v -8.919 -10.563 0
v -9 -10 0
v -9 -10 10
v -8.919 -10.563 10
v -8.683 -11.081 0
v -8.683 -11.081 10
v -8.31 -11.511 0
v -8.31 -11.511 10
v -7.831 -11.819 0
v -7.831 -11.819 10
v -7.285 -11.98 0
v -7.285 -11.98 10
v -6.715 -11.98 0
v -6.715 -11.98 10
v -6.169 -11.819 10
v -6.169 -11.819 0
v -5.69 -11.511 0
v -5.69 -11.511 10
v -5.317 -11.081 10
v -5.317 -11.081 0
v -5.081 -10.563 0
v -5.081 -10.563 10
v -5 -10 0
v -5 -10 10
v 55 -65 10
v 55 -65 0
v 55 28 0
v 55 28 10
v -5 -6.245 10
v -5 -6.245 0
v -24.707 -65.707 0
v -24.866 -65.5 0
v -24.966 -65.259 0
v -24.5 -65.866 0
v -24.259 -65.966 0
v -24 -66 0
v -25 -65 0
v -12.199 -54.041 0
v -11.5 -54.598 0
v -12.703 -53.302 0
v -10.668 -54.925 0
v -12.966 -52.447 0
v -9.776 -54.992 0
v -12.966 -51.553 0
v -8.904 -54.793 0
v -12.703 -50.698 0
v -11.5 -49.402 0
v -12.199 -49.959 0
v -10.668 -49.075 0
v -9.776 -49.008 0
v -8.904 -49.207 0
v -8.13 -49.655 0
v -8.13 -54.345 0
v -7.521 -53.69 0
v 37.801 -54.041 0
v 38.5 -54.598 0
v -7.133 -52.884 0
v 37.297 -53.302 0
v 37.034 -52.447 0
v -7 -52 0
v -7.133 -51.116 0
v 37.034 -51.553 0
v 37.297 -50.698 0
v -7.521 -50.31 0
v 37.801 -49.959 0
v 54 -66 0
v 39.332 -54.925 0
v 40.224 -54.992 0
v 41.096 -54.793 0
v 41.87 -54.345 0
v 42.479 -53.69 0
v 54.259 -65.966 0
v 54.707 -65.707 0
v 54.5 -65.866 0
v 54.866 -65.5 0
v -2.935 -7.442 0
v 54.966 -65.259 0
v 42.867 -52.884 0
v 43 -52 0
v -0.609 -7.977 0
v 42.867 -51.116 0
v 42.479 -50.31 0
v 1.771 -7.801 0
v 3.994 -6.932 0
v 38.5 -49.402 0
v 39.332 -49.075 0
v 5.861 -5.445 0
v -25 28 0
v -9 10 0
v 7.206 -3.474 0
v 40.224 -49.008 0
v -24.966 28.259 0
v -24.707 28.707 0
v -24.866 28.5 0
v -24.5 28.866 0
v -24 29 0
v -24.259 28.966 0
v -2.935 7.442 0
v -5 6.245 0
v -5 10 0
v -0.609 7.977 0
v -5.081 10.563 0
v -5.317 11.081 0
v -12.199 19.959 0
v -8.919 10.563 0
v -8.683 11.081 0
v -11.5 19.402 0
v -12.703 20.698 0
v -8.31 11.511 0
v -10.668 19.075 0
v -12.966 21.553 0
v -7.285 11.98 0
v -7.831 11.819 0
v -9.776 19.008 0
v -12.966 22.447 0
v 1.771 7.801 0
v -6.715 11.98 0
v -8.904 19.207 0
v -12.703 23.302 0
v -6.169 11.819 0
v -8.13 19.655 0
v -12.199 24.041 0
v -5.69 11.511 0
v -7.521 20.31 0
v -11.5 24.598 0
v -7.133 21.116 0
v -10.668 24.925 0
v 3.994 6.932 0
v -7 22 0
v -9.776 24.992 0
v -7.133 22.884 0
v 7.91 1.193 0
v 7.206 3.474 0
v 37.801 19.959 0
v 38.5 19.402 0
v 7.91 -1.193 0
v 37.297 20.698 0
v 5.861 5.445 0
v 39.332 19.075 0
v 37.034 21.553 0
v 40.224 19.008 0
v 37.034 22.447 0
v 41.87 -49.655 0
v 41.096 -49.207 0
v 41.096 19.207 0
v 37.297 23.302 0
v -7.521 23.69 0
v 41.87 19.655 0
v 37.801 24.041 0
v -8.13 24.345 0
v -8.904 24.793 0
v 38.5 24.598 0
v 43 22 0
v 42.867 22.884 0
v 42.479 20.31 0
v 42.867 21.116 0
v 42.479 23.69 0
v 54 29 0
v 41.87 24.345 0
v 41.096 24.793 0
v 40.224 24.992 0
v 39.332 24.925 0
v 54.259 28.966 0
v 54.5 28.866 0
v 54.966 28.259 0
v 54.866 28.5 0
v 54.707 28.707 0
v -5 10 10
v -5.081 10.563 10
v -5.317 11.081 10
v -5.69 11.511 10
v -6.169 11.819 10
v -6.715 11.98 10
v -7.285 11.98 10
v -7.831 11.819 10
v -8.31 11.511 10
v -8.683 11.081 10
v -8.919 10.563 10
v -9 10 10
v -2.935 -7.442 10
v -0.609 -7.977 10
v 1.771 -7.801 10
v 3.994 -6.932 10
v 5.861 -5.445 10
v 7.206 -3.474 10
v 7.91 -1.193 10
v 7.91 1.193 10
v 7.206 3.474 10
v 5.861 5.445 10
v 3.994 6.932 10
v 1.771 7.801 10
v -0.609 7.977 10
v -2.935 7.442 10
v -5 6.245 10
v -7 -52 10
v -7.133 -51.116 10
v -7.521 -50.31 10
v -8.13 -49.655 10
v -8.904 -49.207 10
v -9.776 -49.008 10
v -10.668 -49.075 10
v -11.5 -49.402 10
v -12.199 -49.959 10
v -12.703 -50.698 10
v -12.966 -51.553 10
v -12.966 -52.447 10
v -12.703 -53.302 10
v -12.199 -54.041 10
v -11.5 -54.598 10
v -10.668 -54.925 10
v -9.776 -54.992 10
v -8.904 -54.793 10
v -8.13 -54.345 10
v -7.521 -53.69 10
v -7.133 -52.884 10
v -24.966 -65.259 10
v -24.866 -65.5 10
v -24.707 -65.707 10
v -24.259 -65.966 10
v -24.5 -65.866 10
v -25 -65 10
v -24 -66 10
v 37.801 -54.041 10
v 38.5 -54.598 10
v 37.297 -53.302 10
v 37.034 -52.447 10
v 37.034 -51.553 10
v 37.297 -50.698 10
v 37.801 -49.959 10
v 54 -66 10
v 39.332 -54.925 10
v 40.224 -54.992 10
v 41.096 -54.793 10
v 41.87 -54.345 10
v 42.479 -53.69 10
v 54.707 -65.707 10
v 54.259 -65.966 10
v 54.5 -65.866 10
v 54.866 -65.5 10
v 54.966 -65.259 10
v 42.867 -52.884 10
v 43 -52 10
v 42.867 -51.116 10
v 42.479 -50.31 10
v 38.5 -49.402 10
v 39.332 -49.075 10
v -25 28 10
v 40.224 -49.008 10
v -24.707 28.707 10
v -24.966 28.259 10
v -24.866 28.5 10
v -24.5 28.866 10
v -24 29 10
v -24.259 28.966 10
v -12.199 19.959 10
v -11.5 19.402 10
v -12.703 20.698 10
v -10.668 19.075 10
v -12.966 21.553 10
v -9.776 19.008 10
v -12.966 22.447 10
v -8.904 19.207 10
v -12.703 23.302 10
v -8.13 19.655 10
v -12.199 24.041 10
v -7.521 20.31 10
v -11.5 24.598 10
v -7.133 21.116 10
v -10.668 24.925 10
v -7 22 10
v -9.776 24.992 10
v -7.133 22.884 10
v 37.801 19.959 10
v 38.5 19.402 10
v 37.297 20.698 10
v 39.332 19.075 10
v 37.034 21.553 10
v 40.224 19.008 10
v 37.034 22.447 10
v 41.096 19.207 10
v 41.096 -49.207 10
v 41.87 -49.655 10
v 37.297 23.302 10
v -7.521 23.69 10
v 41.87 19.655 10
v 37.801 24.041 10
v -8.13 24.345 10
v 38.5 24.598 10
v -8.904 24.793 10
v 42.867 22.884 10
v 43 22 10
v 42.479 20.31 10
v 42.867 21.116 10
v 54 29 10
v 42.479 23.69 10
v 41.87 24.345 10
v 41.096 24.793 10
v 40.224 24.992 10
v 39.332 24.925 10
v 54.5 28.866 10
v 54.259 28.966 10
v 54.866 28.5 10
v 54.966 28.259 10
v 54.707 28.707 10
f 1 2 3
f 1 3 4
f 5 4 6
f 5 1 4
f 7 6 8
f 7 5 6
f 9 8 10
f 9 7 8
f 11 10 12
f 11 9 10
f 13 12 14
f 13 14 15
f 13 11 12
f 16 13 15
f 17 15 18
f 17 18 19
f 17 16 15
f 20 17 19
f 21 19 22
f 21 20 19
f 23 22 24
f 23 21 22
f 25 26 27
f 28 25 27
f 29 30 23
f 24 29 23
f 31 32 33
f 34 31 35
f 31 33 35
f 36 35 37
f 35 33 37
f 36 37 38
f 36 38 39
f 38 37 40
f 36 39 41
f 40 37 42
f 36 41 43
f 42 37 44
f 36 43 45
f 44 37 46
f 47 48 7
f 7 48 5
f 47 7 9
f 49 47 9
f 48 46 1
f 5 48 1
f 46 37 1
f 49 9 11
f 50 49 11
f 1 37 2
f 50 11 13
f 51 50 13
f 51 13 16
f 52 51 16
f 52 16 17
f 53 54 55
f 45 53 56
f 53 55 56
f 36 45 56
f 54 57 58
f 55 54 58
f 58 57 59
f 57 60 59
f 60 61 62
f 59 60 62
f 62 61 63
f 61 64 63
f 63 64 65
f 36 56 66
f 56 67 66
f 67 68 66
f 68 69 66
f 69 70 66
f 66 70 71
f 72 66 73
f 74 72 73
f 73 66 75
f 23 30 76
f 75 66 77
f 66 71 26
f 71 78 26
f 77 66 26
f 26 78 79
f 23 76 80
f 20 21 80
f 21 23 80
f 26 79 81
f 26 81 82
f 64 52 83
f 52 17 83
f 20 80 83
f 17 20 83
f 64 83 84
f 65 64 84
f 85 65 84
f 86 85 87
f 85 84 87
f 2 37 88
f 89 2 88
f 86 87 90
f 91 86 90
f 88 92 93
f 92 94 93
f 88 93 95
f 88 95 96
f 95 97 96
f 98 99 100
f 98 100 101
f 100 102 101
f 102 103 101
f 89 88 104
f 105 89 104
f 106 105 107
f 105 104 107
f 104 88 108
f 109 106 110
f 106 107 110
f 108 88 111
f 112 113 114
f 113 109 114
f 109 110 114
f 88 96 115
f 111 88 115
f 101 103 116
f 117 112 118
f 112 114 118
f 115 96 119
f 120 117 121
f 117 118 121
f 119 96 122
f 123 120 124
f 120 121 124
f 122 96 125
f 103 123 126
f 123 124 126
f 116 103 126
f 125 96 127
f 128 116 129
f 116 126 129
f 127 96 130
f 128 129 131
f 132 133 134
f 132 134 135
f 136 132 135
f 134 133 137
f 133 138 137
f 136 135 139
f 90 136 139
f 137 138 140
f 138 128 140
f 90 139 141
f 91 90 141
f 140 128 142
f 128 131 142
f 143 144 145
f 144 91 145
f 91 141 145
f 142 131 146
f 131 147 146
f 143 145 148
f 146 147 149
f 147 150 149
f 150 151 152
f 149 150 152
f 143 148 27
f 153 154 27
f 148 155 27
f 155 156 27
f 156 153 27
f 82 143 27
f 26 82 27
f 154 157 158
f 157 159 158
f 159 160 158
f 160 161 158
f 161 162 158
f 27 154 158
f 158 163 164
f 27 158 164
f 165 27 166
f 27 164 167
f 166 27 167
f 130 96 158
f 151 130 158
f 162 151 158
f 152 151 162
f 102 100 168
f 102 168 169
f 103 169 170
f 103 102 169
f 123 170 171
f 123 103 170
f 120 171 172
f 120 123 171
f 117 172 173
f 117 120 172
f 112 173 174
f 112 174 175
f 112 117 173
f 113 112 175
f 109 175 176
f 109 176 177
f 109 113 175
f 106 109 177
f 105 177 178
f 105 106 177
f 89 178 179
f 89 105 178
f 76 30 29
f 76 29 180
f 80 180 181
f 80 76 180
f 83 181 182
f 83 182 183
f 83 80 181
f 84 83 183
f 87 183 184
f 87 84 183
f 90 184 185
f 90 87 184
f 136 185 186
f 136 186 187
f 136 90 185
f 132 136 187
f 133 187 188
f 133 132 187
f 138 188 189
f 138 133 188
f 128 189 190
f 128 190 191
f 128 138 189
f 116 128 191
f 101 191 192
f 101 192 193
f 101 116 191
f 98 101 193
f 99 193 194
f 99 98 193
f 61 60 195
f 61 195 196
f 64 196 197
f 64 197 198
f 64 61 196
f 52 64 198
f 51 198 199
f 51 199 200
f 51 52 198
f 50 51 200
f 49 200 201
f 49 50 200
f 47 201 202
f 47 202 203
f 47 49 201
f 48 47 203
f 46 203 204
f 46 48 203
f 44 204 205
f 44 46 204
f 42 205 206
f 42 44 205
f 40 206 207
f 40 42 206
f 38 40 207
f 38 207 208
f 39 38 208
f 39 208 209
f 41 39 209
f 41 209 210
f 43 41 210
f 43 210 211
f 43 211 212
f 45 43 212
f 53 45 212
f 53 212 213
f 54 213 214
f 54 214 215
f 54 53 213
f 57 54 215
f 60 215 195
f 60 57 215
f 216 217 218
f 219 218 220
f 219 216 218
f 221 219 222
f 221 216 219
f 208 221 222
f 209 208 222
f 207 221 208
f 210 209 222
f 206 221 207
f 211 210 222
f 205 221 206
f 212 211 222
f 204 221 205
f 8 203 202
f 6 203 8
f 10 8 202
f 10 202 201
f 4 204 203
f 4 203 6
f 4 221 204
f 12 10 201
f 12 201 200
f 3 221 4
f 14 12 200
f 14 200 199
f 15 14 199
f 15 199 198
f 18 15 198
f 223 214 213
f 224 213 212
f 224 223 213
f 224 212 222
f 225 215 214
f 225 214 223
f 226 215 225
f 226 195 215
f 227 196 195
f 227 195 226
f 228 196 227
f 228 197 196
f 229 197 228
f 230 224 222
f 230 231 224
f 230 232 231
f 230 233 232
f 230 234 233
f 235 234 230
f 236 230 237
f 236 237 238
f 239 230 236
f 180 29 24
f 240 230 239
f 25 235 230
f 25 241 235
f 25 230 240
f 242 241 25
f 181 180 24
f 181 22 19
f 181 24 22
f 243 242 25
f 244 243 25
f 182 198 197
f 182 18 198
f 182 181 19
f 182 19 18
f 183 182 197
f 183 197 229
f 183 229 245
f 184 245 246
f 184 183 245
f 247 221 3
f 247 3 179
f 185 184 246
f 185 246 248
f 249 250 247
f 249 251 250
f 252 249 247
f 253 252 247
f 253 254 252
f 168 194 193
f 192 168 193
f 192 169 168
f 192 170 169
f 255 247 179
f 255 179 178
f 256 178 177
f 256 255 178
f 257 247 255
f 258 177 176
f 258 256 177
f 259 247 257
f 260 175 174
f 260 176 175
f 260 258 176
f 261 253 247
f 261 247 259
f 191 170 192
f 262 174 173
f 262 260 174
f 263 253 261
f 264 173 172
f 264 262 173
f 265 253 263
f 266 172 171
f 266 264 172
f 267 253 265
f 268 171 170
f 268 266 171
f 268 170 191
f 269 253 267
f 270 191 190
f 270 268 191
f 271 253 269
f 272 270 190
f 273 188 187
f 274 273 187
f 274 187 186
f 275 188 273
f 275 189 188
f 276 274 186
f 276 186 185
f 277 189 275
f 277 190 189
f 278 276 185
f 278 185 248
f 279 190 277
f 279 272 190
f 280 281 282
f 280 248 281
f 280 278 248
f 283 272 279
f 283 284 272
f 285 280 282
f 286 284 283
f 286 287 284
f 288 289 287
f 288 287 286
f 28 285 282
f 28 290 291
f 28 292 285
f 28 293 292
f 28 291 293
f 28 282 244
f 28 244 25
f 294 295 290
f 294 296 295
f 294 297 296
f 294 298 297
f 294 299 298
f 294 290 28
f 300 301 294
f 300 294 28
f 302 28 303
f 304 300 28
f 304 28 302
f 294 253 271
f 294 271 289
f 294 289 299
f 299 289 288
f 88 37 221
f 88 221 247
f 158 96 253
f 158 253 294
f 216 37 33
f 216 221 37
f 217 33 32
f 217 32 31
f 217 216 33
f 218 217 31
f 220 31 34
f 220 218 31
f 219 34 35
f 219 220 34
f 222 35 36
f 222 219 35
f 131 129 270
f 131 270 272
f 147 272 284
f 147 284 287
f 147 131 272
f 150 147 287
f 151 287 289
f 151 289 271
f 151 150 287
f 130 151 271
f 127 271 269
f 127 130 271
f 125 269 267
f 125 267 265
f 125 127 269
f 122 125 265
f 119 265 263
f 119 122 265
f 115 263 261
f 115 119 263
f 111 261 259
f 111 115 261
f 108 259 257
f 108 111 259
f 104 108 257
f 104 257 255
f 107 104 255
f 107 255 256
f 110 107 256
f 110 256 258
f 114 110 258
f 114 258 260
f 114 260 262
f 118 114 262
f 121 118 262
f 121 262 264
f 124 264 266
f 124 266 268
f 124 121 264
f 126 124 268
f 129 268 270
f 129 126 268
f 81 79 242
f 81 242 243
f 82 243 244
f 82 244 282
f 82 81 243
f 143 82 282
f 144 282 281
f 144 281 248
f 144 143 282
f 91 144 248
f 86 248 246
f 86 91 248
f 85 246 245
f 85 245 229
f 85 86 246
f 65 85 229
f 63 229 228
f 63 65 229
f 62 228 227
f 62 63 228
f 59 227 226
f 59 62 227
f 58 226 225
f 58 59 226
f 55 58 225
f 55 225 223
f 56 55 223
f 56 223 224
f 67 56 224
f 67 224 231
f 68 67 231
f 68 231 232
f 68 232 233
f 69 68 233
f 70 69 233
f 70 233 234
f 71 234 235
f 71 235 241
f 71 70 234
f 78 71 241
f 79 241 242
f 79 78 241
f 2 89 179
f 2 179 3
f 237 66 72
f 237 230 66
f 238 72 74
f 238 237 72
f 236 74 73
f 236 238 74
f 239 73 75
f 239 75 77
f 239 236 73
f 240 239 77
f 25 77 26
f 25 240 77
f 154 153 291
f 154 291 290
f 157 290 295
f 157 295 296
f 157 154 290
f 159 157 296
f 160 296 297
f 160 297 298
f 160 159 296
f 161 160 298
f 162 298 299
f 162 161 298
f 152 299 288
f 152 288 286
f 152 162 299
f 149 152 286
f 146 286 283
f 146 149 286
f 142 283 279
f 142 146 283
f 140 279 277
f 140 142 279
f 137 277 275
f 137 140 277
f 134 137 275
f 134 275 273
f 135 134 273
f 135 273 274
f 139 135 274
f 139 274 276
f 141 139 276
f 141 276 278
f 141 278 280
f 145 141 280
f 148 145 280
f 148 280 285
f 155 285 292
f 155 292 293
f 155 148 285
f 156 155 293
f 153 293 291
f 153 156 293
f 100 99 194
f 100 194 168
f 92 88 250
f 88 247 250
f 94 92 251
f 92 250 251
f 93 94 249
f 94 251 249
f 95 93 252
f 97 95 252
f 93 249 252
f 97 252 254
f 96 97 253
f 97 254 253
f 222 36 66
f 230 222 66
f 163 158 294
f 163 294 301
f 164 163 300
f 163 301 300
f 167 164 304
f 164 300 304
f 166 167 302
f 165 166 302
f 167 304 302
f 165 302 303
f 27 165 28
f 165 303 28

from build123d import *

# Parameters (mm, degrees)
SKETCH_W    = 80
SKETCH_H    = 95
SKETCH_R    = 3
PAD_DEPTH   = 10
FILLET_R    = 1
FILLET001_R = 1


with BuildPart() as part:
    # Sketch → Pad (new body)
    with BuildSketch(Plane.XY):
        with Locations((15, -18.5)):
            Rectangle(SKETCH_W, SKETCH_H)
        with Locations((-10, -52)):
            Circle(SKETCH_R, mode=Mode.SUBTRACT)
        with Locations((40, -52)):
            Circle(SKETCH_R, mode=Mode.SUBTRACT)
        with Locations((40, 22)):
            Circle(SKETCH_R, mode=Mode.SUBTRACT)
        with Locations((-10, 22)):
            Circle(SKETCH_R, mode=Mode.SUBTRACT)
        with BuildLine():
            ThreePointArc((-5, -6.244998), (8, 0), (-5, 6.244998))
            Line((-5, 6.244998), (-5, 10))
            ThreePointArc((-5, 10), (-7, 12), (-9, 10))
            Line((-9, 10), (-9, -10))
            ThreePointArc((-9, -10), (-7, -12), (-5, -10))
            Line((-5, -6.244998), (-5, -10))
        make_face(mode=Mode.SUBTRACT)
    extrude(amount=PAD_DEPTH)

    # Fillet
    fillet_edges = [part.edges().sort_by_distance(p)[0] for p in [
        (-25, -66, 5),
        (-25, 29, 5),
    ]]
    fillet(fillet_edges, radius=FILLET_R)

    # Fillet001
    fillet001_edges = [part.edges().sort_by_distance(p)[0] for p in [
        (55, -66, 5),
        (55, 29, 5),
    ]]
    fillet(fillet001_edges, radius=FILLET001_R)


solid = part.part
